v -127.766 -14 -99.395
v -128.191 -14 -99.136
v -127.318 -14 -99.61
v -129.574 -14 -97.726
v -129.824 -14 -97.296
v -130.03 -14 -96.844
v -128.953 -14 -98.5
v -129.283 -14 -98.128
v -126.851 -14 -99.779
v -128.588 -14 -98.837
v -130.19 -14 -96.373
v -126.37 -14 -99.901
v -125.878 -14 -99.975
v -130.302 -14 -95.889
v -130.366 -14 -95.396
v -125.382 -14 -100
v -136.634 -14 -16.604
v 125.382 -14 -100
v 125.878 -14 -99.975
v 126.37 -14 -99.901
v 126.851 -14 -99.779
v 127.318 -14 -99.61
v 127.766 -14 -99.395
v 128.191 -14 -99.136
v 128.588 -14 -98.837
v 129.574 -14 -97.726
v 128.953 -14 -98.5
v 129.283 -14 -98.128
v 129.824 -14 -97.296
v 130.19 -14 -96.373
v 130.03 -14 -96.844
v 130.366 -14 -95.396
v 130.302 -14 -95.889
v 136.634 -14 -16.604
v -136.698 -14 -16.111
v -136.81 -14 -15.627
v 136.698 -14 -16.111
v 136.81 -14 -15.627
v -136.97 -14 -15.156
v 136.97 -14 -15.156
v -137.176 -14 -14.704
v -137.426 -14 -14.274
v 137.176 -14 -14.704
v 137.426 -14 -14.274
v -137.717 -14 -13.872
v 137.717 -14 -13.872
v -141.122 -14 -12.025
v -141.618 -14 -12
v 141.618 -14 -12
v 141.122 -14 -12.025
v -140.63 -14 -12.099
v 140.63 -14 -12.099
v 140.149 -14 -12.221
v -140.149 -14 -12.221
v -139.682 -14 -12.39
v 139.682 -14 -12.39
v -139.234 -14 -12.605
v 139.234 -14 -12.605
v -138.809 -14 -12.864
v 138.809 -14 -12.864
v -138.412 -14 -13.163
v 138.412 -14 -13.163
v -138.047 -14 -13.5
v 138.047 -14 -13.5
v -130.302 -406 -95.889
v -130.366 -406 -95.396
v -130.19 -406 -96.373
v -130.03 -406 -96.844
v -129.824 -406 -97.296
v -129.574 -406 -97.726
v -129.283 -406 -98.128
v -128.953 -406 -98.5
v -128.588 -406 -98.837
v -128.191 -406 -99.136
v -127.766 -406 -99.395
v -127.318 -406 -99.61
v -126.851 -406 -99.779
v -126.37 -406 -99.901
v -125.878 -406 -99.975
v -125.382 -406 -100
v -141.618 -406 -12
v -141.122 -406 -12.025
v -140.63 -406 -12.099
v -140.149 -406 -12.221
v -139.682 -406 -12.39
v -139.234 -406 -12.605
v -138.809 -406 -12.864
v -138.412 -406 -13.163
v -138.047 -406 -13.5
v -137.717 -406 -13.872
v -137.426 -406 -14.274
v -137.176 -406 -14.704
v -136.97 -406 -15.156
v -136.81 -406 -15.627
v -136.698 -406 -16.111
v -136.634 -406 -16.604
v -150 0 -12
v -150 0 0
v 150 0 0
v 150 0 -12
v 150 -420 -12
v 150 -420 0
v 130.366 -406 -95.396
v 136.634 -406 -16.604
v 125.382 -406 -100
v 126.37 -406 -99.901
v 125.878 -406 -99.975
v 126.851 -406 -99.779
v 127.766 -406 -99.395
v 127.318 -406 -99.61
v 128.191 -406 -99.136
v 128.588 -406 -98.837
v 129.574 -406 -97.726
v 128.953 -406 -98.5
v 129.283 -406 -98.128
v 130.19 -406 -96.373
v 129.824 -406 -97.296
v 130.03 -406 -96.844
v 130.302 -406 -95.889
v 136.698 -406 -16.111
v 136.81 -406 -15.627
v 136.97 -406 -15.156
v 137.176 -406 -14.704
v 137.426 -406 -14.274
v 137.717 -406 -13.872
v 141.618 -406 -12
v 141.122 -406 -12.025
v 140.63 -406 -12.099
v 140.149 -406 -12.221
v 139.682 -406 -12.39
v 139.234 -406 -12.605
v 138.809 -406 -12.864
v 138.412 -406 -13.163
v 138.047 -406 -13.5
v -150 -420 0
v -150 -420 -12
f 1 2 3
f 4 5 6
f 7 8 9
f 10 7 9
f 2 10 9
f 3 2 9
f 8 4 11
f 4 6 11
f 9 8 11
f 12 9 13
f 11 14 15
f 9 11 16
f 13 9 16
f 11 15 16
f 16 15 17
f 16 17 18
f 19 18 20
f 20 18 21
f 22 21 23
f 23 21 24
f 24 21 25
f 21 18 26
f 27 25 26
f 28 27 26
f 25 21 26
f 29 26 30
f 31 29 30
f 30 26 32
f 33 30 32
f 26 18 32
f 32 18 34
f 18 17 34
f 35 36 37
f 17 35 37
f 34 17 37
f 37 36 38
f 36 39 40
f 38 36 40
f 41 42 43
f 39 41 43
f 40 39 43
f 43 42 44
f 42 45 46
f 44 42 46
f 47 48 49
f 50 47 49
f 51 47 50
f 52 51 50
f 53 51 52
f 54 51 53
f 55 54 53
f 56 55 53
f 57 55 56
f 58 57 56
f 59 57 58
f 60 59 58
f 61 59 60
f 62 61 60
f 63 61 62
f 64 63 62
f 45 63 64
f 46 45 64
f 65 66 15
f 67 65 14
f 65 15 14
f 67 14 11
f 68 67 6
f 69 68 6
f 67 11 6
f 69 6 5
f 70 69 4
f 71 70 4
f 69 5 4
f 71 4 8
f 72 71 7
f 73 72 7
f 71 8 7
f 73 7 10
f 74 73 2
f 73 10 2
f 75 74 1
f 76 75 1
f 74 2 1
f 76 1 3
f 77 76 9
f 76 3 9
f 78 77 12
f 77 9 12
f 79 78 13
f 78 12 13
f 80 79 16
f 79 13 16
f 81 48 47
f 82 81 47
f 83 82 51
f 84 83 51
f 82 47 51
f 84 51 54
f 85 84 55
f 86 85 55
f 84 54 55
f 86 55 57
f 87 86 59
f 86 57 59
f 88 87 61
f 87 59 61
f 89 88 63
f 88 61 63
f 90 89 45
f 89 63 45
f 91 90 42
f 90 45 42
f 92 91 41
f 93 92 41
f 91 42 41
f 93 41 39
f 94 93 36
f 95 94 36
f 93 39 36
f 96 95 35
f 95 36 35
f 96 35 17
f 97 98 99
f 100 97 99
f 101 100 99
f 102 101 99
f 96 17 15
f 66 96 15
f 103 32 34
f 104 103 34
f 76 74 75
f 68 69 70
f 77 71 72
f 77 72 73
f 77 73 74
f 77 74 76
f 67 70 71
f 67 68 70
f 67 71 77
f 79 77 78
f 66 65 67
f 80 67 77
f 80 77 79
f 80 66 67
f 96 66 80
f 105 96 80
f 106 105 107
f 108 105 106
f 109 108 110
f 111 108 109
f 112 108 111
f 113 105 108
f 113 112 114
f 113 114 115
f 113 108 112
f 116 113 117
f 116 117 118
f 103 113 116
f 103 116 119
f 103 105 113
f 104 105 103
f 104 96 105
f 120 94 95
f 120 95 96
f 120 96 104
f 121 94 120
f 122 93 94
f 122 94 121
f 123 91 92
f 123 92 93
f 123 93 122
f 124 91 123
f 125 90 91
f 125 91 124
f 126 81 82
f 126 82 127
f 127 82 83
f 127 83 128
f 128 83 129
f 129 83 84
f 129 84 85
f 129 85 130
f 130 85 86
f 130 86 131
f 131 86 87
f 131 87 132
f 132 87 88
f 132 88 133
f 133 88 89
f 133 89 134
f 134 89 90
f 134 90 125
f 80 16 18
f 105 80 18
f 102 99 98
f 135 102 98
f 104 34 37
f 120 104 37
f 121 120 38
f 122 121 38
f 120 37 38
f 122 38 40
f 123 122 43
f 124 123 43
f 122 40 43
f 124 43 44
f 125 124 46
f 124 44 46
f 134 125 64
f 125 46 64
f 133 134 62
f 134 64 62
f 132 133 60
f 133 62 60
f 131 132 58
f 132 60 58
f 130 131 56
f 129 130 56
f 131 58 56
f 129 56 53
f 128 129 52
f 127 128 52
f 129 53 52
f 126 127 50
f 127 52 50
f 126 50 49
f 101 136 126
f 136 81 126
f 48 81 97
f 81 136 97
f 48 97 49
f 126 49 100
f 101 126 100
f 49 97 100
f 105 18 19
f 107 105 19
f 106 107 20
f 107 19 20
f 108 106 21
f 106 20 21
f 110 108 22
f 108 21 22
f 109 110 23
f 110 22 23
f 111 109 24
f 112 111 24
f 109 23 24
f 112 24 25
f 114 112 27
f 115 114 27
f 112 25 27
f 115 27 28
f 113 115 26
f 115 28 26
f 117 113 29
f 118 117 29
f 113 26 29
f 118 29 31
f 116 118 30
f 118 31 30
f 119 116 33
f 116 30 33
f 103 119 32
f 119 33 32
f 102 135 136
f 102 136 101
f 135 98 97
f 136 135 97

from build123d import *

# Parameters (mm, degrees)
F1_DEPTH = 420
F3_DEPTH = 14


# Not quite as in the source:
# - a pattern or mirror of a feature is missing from the dataset's text; its kind, count and spacing are read off the source's solid


with BuildPart() as f1:
    # F0 (on Front) → F1 (new body)
    with BuildSketch(Plane.XZ):
        with BuildLine():
            Line((150, 0), (0, 0))
            Line((0, 0), (-150, 0))
            Line((-150, 0), (-150, -12))
            Line((-150, -12), (-141.6180664814, -12))
            ThreePointArc((-141.6180664814, -12), (-138.2256023722, -13.3269648425), (-136.633810504, -16.6035250927))
            Line((-136.633810504, -16.6035250927), (-130.366189496, -95.3964749073))
            ThreePointArc((-130.366189496, -95.3964749073), (-128.7743976278, -98.6730351575), (-125.3819335186, -100))
            Line((-125.3819335186, -100), (0, -100))
            Line((0, -100), (125.3819335186, -100))
            ThreePointArc((125.3819335186, -100), (128.7743976278, -98.6730351575), (130.366189496, -95.3964749073))
            Line((130.366189496, -95.3964749073), (136.633810504, -16.6035250927))
            ThreePointArc((136.633810504, -16.6035250927), (138.2256023722, -13.3269648425), (141.6180664814, -12))
            Line((141.6180664814, -12), (150, -12))
            Line((150, -12), (150, 0))
        make_face()
    extrude(amount=F1_DEPTH)

    # F2 (on face) → F3 (cut)
    with BuildSketch(Plane.XZ.offset(420)):
        with BuildLine():
            Line((141.6180664814, -12), (-141.6180664814, -12))
            ThreePointArc((-141.6180664814, -12), (-138.2256023722, -13.3269648425), (-136.633810504, -16.6035250927))
            Line((-136.633810504, -16.6035250927), (-130.366189496, -95.3964749073))
            ThreePointArc((-130.366189496, -95.3964749073), (-128.7743976278, -98.6730351575), (-125.3819335186, -100))
            Line((-125.3819335186, -100), (125.3819335186, -100))
            ThreePointArc((125.3819335186, -100), (128.7743976278, -98.6730351575), (130.366189496, -95.3964749073))
            Line((130.366189496, -95.3964749073), (136.633810504, -16.6035250927))
            ThreePointArc((136.633810504, -16.6035250927), (138.2256023722, -13.3269648425), (141.6180664814, -12))
        make_face()
    f3 = extrude(amount=-F3_DEPTH, mode=Mode.SUBTRACT)

    # F3_copies: F3 across plane
    add(f3.mirror(Plane.ZX.offset(-210)), mode=Mode.SUBTRACT)


solid = f1.part
